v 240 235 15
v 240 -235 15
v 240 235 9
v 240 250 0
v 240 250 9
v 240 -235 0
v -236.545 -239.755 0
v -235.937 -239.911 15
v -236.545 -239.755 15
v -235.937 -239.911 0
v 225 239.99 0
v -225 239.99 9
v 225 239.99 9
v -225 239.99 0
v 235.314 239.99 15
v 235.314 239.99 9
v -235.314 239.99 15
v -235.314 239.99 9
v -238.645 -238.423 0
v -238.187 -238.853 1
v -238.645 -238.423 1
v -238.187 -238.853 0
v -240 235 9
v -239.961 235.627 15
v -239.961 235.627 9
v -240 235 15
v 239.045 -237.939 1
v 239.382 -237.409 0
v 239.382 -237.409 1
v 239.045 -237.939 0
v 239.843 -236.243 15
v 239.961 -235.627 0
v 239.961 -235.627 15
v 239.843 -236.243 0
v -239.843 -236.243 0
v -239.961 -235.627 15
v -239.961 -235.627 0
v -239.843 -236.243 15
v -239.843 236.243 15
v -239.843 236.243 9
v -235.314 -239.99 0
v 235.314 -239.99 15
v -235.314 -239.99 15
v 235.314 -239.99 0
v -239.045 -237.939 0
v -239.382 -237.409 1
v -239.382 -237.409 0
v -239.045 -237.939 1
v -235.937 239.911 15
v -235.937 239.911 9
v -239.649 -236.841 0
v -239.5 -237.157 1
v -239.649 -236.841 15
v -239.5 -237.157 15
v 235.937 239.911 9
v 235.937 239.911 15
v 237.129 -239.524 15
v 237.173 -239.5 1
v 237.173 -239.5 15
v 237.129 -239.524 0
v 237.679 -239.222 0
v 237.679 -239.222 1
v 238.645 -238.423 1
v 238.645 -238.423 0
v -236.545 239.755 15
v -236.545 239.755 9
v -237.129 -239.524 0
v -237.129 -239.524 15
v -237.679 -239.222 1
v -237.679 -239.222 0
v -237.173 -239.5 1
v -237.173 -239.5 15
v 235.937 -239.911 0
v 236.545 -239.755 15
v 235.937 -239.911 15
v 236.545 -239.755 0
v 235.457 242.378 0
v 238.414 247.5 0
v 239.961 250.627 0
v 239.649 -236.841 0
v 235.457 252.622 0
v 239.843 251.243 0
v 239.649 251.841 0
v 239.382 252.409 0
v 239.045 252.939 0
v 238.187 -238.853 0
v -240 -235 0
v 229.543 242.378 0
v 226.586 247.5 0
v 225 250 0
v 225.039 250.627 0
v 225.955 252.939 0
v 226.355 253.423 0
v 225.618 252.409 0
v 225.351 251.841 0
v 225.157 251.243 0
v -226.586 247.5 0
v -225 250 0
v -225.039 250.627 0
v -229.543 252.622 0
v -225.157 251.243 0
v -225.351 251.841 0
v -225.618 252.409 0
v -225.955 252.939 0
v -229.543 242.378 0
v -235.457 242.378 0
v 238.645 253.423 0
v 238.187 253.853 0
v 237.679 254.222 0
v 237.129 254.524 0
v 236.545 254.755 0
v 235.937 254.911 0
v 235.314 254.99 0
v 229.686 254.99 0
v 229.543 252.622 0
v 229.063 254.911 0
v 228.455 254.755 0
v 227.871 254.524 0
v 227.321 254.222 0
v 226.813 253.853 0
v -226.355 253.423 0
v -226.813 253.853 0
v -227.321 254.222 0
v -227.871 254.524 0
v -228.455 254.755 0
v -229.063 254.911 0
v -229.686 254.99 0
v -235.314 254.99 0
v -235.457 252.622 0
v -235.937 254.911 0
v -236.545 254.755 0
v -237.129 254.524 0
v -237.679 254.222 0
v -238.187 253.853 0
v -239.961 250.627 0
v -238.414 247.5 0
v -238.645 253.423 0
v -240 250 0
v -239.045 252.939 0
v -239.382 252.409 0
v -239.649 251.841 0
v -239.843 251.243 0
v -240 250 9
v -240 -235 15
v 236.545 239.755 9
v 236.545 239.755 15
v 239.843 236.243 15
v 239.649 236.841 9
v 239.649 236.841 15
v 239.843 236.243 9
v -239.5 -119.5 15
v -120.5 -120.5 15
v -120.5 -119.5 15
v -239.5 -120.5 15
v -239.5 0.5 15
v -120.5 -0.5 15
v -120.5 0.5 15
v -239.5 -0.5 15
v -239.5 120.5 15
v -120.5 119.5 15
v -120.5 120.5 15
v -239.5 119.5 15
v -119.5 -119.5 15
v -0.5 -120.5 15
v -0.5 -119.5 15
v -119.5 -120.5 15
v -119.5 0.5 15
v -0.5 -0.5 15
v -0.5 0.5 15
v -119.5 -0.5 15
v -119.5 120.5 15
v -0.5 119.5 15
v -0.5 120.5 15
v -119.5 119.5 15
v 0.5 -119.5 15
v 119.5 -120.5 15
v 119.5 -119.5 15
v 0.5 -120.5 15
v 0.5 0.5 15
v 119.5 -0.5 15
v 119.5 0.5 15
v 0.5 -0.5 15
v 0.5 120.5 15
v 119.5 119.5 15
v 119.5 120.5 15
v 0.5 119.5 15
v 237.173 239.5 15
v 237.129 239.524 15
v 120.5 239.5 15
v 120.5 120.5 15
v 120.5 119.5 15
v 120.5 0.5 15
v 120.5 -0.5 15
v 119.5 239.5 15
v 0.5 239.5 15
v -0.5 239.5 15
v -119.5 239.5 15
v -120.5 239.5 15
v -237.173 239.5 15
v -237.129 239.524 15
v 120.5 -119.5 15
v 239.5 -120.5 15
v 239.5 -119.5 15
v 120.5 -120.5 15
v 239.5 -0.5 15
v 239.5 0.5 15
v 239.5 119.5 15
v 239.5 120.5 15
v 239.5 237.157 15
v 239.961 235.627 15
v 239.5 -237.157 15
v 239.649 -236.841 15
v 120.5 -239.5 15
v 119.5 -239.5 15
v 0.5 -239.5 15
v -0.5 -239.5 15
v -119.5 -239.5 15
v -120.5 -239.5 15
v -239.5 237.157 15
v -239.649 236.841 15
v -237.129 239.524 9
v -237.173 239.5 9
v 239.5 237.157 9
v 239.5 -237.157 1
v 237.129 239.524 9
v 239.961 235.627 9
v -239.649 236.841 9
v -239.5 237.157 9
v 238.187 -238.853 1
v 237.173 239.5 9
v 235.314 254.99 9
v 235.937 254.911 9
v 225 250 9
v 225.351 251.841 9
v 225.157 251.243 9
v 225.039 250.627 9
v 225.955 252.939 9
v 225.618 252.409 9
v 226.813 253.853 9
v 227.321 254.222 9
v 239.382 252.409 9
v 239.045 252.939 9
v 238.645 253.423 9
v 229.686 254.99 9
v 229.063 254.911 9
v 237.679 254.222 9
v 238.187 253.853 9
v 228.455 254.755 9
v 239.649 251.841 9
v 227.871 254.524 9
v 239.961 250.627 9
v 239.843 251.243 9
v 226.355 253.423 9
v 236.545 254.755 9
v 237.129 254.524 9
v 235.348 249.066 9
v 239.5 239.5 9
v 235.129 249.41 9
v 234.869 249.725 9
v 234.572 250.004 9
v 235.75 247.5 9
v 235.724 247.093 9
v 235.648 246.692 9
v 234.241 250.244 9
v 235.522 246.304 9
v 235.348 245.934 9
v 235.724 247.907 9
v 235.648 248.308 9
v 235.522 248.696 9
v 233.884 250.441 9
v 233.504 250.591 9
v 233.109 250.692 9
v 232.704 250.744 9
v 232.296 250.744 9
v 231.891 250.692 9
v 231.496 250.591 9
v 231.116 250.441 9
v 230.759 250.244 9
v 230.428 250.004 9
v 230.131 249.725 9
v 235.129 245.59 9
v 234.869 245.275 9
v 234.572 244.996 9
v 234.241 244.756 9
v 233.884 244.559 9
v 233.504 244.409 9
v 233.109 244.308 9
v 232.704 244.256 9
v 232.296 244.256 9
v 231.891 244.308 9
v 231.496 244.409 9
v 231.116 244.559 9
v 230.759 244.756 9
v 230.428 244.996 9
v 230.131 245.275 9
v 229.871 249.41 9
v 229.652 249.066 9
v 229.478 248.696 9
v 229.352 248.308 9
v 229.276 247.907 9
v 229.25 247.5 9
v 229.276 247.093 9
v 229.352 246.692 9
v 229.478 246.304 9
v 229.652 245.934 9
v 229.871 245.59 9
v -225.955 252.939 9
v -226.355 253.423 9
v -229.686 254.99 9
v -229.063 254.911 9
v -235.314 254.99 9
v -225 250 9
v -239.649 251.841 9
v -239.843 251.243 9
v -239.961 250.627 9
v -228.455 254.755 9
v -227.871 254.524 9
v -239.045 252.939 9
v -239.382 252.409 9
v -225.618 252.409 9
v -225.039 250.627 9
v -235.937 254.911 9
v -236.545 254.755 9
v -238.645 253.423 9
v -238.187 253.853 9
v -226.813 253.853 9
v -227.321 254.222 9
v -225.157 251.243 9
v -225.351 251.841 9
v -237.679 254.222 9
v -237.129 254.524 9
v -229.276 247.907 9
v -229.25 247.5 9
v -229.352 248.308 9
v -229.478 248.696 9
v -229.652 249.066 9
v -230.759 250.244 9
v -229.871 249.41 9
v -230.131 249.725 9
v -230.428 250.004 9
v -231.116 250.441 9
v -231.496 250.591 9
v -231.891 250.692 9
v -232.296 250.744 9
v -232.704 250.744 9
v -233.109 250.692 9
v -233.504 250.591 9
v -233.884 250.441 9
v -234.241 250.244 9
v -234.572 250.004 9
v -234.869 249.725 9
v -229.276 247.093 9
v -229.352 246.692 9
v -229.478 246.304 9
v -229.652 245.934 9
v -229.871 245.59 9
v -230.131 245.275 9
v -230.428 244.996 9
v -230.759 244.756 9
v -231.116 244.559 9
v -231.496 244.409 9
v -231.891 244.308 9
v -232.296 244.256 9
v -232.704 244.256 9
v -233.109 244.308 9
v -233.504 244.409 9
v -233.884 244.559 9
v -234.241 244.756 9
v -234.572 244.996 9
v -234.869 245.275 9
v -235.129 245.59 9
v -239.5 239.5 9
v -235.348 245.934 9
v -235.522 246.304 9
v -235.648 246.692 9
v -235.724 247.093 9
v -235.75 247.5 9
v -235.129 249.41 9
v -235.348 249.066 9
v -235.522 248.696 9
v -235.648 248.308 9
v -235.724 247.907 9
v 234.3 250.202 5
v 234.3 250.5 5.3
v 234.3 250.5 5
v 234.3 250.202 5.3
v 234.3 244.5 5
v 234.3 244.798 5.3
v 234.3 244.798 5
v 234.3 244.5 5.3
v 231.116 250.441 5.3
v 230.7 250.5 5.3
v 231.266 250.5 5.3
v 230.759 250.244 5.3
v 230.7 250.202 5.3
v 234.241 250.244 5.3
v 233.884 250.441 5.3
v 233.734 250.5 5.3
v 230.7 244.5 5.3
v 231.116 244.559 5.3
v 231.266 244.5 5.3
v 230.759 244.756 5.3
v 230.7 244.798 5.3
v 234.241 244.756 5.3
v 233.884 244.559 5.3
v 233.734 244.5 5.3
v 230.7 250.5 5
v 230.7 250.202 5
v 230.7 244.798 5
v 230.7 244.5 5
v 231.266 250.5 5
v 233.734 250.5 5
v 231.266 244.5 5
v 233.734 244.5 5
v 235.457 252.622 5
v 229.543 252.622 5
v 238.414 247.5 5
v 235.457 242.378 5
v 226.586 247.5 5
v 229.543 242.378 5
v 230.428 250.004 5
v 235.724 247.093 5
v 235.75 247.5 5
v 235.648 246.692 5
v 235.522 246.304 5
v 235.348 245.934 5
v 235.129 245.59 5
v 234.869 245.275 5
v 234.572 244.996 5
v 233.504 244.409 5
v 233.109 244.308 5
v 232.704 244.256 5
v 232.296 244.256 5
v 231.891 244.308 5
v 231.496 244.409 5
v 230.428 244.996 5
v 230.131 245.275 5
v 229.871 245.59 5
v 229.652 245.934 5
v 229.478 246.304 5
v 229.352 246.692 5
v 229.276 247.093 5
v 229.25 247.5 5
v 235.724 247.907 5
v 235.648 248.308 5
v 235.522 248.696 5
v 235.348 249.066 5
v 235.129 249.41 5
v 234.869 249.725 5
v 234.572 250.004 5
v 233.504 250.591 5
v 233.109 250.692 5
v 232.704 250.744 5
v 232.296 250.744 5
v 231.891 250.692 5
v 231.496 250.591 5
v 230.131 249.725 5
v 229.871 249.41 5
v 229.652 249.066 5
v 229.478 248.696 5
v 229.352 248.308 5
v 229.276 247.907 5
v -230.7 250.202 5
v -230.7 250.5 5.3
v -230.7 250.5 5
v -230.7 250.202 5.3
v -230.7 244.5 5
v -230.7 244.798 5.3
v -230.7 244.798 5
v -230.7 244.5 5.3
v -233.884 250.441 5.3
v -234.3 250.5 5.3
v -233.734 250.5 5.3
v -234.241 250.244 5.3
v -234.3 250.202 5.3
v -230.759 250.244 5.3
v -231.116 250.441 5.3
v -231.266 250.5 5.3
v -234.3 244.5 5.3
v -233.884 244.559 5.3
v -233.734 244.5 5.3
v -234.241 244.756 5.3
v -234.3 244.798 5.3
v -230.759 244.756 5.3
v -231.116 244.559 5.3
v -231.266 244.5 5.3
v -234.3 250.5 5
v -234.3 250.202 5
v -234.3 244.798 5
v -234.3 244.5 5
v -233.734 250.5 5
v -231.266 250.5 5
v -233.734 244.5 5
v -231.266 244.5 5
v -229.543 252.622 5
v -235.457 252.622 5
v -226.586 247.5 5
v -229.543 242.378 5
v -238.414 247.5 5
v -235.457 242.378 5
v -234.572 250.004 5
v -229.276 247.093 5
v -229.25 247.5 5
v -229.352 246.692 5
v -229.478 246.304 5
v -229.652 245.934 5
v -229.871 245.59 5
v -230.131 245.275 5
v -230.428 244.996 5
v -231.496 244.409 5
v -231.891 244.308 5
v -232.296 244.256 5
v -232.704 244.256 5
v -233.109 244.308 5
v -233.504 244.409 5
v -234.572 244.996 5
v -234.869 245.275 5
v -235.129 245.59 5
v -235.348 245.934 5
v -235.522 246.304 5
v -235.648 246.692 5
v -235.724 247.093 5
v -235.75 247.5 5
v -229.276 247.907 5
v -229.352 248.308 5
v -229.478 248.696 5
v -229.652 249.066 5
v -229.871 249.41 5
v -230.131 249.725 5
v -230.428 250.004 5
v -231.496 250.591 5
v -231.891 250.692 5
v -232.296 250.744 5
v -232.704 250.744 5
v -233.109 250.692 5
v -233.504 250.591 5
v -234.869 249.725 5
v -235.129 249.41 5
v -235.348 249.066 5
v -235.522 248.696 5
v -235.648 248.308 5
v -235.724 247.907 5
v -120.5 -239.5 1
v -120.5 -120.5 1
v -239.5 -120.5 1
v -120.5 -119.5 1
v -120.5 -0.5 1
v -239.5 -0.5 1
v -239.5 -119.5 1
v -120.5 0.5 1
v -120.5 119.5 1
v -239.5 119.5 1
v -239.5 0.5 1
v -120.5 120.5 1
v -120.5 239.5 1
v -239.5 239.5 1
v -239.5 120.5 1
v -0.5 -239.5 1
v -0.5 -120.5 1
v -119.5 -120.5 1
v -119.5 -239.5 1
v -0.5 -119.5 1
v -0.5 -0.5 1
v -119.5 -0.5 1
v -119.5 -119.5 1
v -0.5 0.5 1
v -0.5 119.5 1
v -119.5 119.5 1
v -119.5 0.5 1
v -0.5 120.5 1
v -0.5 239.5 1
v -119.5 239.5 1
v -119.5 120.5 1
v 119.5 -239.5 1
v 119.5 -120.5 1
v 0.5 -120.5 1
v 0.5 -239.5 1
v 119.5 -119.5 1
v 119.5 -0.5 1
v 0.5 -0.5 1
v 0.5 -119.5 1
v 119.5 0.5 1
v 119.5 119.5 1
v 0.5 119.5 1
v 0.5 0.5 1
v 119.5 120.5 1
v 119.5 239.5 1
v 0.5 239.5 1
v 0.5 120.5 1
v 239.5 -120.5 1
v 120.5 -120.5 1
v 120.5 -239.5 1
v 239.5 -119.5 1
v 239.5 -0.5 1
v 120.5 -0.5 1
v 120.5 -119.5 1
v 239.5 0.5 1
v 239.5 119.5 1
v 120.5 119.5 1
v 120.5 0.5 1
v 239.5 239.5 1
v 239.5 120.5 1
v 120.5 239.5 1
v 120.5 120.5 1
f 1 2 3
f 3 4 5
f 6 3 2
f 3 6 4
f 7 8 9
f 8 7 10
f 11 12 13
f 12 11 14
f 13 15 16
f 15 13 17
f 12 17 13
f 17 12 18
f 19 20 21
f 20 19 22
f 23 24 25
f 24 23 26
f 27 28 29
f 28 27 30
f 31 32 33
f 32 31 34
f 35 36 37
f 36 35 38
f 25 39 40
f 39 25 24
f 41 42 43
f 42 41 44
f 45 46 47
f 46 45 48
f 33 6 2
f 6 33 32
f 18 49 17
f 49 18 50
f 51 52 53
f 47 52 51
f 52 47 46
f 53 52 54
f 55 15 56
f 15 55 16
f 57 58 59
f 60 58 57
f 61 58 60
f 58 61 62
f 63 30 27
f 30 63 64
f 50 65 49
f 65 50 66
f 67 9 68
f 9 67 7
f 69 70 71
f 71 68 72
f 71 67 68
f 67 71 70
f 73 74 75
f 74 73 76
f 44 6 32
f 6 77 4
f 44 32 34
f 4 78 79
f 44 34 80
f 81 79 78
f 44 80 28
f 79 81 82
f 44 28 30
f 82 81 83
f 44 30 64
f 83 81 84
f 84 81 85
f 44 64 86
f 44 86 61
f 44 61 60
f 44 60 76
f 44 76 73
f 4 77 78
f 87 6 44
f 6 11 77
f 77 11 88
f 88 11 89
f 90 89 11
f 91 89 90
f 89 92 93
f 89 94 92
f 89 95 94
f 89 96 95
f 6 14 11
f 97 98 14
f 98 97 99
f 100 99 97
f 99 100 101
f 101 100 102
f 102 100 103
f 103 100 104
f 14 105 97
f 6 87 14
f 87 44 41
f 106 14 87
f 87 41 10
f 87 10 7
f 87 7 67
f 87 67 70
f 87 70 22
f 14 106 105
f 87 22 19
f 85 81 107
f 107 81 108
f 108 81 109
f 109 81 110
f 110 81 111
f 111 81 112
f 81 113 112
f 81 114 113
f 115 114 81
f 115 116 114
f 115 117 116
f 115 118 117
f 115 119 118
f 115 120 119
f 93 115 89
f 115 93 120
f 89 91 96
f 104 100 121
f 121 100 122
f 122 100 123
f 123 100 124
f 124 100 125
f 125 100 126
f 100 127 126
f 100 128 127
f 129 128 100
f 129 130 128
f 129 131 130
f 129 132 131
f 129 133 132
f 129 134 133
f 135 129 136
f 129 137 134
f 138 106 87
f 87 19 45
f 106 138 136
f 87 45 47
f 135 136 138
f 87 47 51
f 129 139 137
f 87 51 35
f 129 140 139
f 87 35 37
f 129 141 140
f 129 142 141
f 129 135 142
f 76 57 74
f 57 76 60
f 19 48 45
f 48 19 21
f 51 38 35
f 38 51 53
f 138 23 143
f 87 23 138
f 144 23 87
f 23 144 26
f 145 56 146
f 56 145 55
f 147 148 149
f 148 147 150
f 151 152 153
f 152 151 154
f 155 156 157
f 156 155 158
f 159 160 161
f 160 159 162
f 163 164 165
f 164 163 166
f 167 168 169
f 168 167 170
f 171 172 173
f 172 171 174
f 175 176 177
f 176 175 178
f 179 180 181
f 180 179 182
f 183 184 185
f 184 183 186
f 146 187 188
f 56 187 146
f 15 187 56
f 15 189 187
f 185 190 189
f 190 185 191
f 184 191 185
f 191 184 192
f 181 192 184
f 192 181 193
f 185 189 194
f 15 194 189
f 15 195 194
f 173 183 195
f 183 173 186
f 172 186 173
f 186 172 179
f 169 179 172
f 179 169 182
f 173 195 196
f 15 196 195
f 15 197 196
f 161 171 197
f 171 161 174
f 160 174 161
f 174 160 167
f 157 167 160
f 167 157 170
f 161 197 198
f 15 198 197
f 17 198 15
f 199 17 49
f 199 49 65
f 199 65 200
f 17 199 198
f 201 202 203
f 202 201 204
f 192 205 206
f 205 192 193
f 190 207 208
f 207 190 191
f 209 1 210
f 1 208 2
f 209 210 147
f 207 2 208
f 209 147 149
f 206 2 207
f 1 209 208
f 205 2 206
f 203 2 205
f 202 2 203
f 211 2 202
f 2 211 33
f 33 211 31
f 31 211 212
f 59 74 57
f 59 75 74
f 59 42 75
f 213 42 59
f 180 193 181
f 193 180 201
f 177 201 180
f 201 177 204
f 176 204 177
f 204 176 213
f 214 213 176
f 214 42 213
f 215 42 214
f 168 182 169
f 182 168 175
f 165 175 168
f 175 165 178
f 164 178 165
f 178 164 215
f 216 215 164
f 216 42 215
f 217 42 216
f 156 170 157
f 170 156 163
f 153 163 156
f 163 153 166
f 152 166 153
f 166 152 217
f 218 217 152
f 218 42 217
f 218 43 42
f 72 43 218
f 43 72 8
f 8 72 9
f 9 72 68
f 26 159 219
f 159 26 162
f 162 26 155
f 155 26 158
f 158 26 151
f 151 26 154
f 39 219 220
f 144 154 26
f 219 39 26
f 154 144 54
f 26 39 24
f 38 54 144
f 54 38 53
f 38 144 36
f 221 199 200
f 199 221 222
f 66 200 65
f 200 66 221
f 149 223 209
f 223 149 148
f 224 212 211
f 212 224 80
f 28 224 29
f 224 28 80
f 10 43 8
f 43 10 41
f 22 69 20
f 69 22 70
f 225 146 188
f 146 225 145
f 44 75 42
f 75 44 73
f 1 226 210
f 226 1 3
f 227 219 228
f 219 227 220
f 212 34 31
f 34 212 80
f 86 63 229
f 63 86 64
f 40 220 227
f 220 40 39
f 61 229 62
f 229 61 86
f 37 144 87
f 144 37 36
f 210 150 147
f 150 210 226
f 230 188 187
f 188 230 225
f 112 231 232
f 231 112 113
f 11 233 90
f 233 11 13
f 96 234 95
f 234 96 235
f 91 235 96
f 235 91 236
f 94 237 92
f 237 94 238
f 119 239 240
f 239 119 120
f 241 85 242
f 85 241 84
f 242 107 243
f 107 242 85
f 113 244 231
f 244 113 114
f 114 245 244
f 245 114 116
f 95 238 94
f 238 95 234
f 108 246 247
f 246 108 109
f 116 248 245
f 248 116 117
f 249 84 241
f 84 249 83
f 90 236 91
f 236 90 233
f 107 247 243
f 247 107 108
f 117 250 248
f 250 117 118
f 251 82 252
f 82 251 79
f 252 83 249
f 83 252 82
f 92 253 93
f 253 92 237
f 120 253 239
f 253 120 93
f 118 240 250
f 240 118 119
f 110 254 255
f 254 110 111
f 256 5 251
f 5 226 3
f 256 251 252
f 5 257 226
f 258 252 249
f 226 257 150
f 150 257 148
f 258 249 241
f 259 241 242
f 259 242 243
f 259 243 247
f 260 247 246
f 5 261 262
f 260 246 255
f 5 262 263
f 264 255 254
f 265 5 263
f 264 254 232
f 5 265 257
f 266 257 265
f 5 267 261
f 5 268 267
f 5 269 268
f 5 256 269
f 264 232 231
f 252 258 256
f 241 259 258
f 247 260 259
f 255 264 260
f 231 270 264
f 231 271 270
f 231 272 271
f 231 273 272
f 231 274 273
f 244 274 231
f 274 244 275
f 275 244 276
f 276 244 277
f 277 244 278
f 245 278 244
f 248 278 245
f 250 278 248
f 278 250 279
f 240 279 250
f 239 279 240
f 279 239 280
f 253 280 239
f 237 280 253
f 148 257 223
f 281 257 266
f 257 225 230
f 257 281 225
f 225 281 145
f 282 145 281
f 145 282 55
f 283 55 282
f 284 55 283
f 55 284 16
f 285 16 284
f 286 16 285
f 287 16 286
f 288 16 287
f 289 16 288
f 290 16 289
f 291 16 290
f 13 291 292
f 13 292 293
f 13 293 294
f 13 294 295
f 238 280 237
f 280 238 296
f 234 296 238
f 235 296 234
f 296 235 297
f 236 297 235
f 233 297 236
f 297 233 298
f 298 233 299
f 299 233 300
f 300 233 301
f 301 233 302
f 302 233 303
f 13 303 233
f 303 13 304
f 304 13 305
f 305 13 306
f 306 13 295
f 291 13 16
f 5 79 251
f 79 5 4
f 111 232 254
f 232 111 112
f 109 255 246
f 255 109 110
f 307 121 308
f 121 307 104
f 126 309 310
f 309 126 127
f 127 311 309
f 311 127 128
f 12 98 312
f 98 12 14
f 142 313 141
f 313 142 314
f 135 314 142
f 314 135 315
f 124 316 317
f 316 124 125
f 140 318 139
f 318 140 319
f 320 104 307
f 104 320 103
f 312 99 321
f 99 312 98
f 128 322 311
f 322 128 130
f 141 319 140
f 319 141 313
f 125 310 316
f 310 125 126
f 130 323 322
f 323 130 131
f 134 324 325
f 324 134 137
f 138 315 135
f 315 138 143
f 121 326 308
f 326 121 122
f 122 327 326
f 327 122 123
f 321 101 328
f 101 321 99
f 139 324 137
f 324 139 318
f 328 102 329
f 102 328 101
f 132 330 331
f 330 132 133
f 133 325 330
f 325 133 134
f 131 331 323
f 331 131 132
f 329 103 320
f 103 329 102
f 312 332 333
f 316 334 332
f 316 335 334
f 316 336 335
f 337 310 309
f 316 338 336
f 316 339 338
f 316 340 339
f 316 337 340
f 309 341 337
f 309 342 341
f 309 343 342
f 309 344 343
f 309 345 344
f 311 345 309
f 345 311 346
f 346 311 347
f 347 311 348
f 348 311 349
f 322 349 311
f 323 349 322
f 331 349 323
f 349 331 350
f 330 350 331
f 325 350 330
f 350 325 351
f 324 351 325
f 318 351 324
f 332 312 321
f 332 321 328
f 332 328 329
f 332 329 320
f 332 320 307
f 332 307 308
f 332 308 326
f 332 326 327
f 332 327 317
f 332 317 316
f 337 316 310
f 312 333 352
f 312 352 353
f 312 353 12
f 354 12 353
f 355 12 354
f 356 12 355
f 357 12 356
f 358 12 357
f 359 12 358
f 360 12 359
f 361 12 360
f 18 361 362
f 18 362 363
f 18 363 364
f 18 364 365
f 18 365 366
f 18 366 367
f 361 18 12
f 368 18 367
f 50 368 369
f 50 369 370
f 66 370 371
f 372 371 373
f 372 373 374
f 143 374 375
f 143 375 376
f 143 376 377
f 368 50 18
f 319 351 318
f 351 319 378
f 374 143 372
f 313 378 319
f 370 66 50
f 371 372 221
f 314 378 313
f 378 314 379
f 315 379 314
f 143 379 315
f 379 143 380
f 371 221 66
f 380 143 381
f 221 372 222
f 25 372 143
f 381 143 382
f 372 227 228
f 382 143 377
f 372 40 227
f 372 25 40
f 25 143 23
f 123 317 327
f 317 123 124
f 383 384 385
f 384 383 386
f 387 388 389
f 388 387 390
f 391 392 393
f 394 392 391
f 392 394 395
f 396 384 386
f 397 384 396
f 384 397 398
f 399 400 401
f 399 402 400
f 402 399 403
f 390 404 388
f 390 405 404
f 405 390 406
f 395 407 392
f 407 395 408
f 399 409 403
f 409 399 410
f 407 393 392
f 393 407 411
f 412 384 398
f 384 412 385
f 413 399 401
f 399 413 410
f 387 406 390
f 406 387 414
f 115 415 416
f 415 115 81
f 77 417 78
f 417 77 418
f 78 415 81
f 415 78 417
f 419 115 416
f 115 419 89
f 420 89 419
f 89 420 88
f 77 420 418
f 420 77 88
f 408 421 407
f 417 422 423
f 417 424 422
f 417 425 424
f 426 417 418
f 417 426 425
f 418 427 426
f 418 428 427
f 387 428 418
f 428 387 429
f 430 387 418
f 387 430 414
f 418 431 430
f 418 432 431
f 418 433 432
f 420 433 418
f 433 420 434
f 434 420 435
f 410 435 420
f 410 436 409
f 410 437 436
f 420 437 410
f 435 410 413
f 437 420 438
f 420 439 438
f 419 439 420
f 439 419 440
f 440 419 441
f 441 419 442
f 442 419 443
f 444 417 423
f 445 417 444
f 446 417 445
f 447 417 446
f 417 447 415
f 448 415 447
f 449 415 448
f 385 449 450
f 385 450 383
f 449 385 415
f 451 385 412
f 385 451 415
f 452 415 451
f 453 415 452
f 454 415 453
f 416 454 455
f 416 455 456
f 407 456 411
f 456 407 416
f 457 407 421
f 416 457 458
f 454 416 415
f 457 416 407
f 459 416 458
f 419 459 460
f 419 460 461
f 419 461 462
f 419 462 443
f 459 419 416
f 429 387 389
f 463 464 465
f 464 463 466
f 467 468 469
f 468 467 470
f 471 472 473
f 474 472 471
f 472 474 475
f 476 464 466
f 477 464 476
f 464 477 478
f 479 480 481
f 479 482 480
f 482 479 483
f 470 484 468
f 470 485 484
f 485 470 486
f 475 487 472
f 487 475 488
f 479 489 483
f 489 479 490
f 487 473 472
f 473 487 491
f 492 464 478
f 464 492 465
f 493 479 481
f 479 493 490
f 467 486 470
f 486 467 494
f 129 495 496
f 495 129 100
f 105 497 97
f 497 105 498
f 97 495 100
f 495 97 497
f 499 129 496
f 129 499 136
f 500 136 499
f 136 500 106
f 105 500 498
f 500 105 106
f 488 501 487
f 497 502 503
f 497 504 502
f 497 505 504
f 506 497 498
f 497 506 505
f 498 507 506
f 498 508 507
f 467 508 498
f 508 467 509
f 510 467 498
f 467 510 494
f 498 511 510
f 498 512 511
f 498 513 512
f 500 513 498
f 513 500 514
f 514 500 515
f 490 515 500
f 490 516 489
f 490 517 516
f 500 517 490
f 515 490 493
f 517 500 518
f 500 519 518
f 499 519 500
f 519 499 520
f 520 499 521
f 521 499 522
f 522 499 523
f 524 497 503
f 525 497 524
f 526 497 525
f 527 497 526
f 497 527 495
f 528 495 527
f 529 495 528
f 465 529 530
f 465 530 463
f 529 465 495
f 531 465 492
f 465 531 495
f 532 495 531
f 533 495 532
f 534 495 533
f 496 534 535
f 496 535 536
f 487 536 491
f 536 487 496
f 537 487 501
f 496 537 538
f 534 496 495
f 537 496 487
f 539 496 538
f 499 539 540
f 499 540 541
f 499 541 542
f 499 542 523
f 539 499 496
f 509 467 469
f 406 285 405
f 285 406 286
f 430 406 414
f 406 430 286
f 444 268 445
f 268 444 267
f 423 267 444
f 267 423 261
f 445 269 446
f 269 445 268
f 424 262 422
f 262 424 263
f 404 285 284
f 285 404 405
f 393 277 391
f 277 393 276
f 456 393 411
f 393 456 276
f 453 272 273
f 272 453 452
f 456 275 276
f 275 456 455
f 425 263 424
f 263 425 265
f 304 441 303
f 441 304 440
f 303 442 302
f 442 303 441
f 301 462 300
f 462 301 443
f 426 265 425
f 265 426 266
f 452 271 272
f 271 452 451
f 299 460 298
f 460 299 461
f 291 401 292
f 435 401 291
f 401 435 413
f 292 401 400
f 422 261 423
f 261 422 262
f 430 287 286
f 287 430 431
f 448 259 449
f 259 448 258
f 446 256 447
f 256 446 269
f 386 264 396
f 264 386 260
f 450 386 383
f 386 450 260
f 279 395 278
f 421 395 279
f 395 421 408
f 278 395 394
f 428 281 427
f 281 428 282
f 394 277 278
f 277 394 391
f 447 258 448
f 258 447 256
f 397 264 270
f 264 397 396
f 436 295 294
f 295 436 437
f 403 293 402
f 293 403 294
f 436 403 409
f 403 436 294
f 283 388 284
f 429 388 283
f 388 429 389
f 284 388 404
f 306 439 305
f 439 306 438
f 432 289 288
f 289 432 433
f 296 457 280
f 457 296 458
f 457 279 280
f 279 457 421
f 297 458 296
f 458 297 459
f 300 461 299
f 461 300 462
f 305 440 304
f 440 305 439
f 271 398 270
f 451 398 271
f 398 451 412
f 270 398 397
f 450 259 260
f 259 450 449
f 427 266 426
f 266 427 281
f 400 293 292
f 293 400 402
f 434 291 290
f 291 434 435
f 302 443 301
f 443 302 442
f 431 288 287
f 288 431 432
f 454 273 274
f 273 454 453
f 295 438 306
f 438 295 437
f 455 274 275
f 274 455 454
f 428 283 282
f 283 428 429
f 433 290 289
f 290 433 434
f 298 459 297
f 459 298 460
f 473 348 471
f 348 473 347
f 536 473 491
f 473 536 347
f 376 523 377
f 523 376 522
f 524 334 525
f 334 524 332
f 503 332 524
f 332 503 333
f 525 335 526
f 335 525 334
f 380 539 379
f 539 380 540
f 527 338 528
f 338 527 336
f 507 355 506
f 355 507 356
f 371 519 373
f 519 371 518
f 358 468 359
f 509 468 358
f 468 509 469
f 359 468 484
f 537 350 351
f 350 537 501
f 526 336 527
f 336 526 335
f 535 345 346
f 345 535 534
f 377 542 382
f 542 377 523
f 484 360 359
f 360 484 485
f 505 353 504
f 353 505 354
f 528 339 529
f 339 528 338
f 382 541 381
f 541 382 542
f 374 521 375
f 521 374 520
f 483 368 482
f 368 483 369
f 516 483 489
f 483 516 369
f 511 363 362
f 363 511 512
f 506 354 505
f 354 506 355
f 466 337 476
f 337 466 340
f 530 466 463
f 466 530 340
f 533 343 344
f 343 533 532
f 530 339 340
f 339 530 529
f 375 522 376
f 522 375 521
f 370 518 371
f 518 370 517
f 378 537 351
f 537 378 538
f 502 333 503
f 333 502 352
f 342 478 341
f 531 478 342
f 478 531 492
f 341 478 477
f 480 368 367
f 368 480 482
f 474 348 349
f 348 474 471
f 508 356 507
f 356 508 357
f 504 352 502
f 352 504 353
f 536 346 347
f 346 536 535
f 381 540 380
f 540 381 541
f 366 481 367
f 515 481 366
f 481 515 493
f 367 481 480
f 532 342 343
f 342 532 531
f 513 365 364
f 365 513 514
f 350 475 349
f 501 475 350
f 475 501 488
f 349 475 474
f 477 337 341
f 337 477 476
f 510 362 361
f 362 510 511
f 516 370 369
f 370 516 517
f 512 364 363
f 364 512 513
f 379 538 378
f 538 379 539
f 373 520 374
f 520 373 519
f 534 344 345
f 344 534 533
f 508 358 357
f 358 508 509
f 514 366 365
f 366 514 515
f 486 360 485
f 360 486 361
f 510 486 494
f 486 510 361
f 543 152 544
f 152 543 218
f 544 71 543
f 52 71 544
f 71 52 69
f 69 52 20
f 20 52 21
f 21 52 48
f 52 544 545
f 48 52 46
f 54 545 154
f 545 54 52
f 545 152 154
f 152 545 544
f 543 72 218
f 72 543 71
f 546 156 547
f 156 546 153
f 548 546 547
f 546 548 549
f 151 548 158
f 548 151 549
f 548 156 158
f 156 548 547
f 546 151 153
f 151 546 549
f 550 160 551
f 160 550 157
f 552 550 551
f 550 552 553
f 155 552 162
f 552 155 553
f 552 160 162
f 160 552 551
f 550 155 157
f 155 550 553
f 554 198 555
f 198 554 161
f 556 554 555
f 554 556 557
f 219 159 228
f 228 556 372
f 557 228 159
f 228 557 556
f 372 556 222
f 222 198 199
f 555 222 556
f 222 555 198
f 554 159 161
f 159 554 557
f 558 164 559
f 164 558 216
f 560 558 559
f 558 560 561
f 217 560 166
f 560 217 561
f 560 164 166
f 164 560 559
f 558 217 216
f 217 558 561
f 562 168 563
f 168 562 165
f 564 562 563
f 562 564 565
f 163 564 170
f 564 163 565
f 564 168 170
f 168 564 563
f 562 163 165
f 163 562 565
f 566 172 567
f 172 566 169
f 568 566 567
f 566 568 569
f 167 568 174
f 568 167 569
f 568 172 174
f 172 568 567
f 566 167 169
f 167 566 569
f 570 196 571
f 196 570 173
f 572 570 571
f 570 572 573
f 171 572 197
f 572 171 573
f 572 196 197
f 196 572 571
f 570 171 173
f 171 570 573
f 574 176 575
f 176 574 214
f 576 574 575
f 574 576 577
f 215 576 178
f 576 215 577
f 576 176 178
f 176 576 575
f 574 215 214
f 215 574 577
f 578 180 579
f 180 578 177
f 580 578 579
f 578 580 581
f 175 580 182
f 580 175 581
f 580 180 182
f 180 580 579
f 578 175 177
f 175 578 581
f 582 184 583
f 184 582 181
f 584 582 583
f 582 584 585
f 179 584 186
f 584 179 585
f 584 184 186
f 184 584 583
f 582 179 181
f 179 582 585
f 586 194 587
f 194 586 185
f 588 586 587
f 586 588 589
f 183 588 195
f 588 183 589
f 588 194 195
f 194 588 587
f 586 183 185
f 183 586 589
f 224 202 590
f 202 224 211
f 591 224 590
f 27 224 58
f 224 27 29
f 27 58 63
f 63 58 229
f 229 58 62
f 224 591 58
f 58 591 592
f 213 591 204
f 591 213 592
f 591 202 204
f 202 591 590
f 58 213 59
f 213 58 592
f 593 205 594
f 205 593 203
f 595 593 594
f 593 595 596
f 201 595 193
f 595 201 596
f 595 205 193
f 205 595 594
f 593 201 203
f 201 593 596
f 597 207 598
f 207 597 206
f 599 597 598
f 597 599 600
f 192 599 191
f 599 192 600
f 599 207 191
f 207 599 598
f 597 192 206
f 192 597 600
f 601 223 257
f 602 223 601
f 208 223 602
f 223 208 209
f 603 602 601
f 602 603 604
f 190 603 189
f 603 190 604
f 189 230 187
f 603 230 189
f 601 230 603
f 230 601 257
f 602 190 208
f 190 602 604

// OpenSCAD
$fn = 50;


difference() {
	union() {
		hull() {
			translate(v = [-235.0000000000, 235.0000000000, 0]) {
				cylinder(h = 15, r = 5);
			}
			translate(v = [235.0000000000, 235.0000000000, 0]) {
				cylinder(h = 15, r = 5);
			}
			translate(v = [-235.0000000000, -235.0000000000, 0]) {
				cylinder(h = 15, r = 5);
			}
			translate(v = [235.0000000000, -235.0000000000, 0]) {
				cylinder(h = 15, r = 5);
			}
		}
		translate(v = [232.5000000000, 7.5000000000, 0]) {
			hull() {
				translate(v = [-2.5000000000, 242.5000000000, 0]) {
					cylinder(h = 9, r = 5);
				}
				translate(v = [2.5000000000, 242.5000000000, 0]) {
					cylinder(h = 9, r = 5);
				}
				translate(v = [-2.5000000000, -242.5000000000, 0]) {
					cylinder(h = 9, r = 5);
				}
				translate(v = [2.5000000000, -242.5000000000, 0]) {
					cylinder(h = 9, r = 5);
				}
			}
		}
		translate(v = [-232.5000000000, 7.5000000000, 0]) {
			hull() {
				translate(v = [-2.5000000000, 242.5000000000, 0]) {
					cylinder(h = 9, r = 5);
				}
				translate(v = [2.5000000000, 242.5000000000, 0]) {
					cylinder(h = 9, r = 5);
				}
				translate(v = [-2.5000000000, -242.5000000000, 0]) {
					cylinder(h = 9, r = 5);
				}
				translate(v = [2.5000000000, -242.5000000000, 0]) {
					cylinder(h = 9, r = 5);
				}
			}
		}
	}
	union() {
		translate(v = [232.5000000000, 247.5000000000, 0]) {
			rotate(a = [0, 0, 0]) {
				difference() {
					union() {
						translate(v = [-1.8000000000, -3.0000000000, -0.3000000000]) {
							cube(size = [3.6000000000, 6.0000000000, 0.3000000000]);
						}
						translate(v = [-1.8000000000, -1.8000000000, -0.6000000000]) {
							cube(size = [3.6000000000, 3.6000000000, 0.3000000000]);
						}
						translate(v = [-1.8000000000, -3.0000000000, 5]) {
							cube(size = [3.6000000000, 6.0000000000, 0.3000000000]);
						}
						translate(v = [-1.8000000000, -1.8000000000, 5.3000000000]) {
							cube(size = [3.6000000000, 3.6000000000, 0.3000000000]);
						}
						linear_extrude(height = 5) {
							polygon(points = [[5.9142500000, 0.0000000000], [2.9571250000, 5.1218907443], [-2.9571250000, 5.1218907443], [-5.9142500000, 0.0000000000], [-2.9571250000, -5.1218907443], [2.9571250000, -5.1218907443]]);
						}
						translate(v = [-1.8000000000, -3.0000000000, -0.3000000000]) {
							cube(size = [3.6000000000, 6.0000000000, 0.3000000000]);
						}
						translate(v = [-1.8000000000, -1.8000000000, -0.6000000000]) {
							cube(size = [3.6000000000, 3.6000000000, 0.3000000000]);
						}
						translate(v = [-1.8000000000, -3.0000000000, 5]) {
							cube(size = [3.6000000000, 6.0000000000, 0.3000000000]);
						}
						translate(v = [-1.8000000000, -1.8000000000, 5.3000000000]) {
							cube(size = [3.6000000000, 3.6000000000, 0.3000000000]);
						}
						translate(v = [-1.8000000000, -3.0000000000, -0.3000000000]) {
							cube(size = [3.6000000000, 6.0000000000, 0.3000000000]);
						}
						translate(v = [-1.8000000000, -1.8000000000, -0.6000000000]) {
							cube(size = [3.6000000000, 3.6000000000, 0.3000000000]);
						}
						translate(v = [-1.8000000000, -3.0000000000, 5]) {
							cube(size = [3.6000000000, 6.0000000000, 0.3000000000]);
						}
						translate(v = [-1.8000000000, -1.8000000000, 5.3000000000]) {
							cube(size = [3.6000000000, 3.6000000000, 0.3000000000]);
						}
					}
					union();
				}
			}
		}
		translate(v = [-232.5000000000, 247.5000000000, 0]) {
			rotate(a = [0, 0, 0]) {
				difference() {
					union() {
						translate(v = [-1.8000000000, -3.0000000000, -0.3000000000]) {
							cube(size = [3.6000000000, 6.0000000000, 0.3000000000]);
						}
						translate(v = [-1.8000000000, -1.8000000000, -0.6000000000]) {
							cube(size = [3.6000000000, 3.6000000000, 0.3000000000]);
						}
						translate(v = [-1.8000000000, -3.0000000000, 5]) {
							cube(size = [3.6000000000, 6.0000000000, 0.3000000000]);
						}
						translate(v = [-1.8000000000, -1.8000000000, 5.3000000000]) {
							cube(size = [3.6000000000, 3.6000000000, 0.3000000000]);
						}
						linear_extrude(height = 5) {
							polygon(points = [[5.9142500000, 0.0000000000], [2.9571250000, 5.1218907443], [-2.9571250000, 5.1218907443], [-5.9142500000, 0.0000000000], [-2.9571250000, -5.1218907443], [2.9571250000, -5.1218907443]]);
						}
						translate(v = [-1.8000000000, -3.0000000000, -0.3000000000]) {
							cube(size = [3.6000000000, 6.0000000000, 0.3000000000]);
						}
						translate(v = [-1.8000000000, -1.8000000000, -0.6000000000]) {
							cube(size = [3.6000000000, 3.6000000000, 0.3000000000]);
						}
						translate(v = [-1.8000000000, -3.0000000000, 5]) {
							cube(size = [3.6000000000, 6.0000000000, 0.3000000000]);
						}
						translate(v = [-1.8000000000, -1.8000000000, 5.3000000000]) {
							cube(size = [3.6000000000, 3.6000000000, 0.3000000000]);
						}
						translate(v = [-1.8000000000, -3.0000000000, -0.3000000000]) {
							cube(size = [3.6000000000, 6.0000000000, 0.3000000000]);
						}
						translate(v = [-1.8000000000, -1.8000000000, -0.6000000000]) {
							cube(size = [3.6000000000, 3.6000000000, 0.3000000000]);
						}
						translate(v = [-1.8000000000, -3.0000000000, 5]) {
							cube(size = [3.6000000000, 6.0000000000, 0.3000000000]);
						}
						translate(v = [-1.8000000000, -1.8000000000, 5.3000000000]) {
							cube(size = [3.6000000000, 3.6000000000, 0.3000000000]);
						}
					}
					union();
				}
			}
		}
		translate(v = [232.5000000000, 247.5000000000, -100.0000000000]) {
			cylinder(h = 200, r = 3.2500000000);
		}
		translate(v = [-232.5000000000, 247.5000000000, -100.0000000000]) {
			cylinder(h = 200, r = 3.2500000000);
		}
		#translate(v = [-239.5000000000, -239.5000000000, 1]) {
			cube(size = [119, 119, 30]);
		}
		#translate(v = [-239.5000000000, -119.5000000000, 1]) {
			cube(size = [119, 119, 30]);
		}
		#translate(v = [-239.5000000000, 0.5000000000, 1]) {
			cube(size = [119, 119, 30]);
		}
		#translate(v = [-239.5000000000, 120.5000000000, 1]) {
			cube(size = [119, 119, 30]);
		}
		#translate(v = [-119.5000000000, -239.5000000000, 1]) {
			cube(size = [119, 119, 30]);
		}
		#translate(v = [-119.5000000000, -119.5000000000, 1]) {
			cube(size = [119, 119, 30]);
		}
		#translate(v = [-119.5000000000, 0.5000000000, 1]) {
			cube(size = [119, 119, 30]);
		}
		#translate(v = [-119.5000000000, 120.5000000000, 1]) {
			cube(size = [119, 119, 30]);
		}
		#translate(v = [0.5000000000, -239.5000000000, 1]) {
			cube(size = [119, 119, 30]);
		}
		#translate(v = [0.5000000000, -119.5000000000, 1]) {
			cube(size = [119, 119, 30]);
		}
		#translate(v = [0.5000000000, 0.5000000000, 1]) {
			cube(size = [119, 119, 30]);
		}
		#translate(v = [0.5000000000, 120.5000000000, 1]) {
			cube(size = [119, 119, 30]);
		}
		#translate(v = [120.5000000000, -239.5000000000, 1]) {
			cube(size = [119, 119, 30]);
		}
		#translate(v = [120.5000000000, -119.5000000000, 1]) {
			cube(size = [119, 119, 30]);
		}
		#translate(v = [120.5000000000, 0.5000000000, 1]) {
			cube(size = [119, 119, 30]);
		}
		#translate(v = [120.5000000000, 120.5000000000, 1]) {
			cube(size = [119, 119, 30]);
		}
	}
}
